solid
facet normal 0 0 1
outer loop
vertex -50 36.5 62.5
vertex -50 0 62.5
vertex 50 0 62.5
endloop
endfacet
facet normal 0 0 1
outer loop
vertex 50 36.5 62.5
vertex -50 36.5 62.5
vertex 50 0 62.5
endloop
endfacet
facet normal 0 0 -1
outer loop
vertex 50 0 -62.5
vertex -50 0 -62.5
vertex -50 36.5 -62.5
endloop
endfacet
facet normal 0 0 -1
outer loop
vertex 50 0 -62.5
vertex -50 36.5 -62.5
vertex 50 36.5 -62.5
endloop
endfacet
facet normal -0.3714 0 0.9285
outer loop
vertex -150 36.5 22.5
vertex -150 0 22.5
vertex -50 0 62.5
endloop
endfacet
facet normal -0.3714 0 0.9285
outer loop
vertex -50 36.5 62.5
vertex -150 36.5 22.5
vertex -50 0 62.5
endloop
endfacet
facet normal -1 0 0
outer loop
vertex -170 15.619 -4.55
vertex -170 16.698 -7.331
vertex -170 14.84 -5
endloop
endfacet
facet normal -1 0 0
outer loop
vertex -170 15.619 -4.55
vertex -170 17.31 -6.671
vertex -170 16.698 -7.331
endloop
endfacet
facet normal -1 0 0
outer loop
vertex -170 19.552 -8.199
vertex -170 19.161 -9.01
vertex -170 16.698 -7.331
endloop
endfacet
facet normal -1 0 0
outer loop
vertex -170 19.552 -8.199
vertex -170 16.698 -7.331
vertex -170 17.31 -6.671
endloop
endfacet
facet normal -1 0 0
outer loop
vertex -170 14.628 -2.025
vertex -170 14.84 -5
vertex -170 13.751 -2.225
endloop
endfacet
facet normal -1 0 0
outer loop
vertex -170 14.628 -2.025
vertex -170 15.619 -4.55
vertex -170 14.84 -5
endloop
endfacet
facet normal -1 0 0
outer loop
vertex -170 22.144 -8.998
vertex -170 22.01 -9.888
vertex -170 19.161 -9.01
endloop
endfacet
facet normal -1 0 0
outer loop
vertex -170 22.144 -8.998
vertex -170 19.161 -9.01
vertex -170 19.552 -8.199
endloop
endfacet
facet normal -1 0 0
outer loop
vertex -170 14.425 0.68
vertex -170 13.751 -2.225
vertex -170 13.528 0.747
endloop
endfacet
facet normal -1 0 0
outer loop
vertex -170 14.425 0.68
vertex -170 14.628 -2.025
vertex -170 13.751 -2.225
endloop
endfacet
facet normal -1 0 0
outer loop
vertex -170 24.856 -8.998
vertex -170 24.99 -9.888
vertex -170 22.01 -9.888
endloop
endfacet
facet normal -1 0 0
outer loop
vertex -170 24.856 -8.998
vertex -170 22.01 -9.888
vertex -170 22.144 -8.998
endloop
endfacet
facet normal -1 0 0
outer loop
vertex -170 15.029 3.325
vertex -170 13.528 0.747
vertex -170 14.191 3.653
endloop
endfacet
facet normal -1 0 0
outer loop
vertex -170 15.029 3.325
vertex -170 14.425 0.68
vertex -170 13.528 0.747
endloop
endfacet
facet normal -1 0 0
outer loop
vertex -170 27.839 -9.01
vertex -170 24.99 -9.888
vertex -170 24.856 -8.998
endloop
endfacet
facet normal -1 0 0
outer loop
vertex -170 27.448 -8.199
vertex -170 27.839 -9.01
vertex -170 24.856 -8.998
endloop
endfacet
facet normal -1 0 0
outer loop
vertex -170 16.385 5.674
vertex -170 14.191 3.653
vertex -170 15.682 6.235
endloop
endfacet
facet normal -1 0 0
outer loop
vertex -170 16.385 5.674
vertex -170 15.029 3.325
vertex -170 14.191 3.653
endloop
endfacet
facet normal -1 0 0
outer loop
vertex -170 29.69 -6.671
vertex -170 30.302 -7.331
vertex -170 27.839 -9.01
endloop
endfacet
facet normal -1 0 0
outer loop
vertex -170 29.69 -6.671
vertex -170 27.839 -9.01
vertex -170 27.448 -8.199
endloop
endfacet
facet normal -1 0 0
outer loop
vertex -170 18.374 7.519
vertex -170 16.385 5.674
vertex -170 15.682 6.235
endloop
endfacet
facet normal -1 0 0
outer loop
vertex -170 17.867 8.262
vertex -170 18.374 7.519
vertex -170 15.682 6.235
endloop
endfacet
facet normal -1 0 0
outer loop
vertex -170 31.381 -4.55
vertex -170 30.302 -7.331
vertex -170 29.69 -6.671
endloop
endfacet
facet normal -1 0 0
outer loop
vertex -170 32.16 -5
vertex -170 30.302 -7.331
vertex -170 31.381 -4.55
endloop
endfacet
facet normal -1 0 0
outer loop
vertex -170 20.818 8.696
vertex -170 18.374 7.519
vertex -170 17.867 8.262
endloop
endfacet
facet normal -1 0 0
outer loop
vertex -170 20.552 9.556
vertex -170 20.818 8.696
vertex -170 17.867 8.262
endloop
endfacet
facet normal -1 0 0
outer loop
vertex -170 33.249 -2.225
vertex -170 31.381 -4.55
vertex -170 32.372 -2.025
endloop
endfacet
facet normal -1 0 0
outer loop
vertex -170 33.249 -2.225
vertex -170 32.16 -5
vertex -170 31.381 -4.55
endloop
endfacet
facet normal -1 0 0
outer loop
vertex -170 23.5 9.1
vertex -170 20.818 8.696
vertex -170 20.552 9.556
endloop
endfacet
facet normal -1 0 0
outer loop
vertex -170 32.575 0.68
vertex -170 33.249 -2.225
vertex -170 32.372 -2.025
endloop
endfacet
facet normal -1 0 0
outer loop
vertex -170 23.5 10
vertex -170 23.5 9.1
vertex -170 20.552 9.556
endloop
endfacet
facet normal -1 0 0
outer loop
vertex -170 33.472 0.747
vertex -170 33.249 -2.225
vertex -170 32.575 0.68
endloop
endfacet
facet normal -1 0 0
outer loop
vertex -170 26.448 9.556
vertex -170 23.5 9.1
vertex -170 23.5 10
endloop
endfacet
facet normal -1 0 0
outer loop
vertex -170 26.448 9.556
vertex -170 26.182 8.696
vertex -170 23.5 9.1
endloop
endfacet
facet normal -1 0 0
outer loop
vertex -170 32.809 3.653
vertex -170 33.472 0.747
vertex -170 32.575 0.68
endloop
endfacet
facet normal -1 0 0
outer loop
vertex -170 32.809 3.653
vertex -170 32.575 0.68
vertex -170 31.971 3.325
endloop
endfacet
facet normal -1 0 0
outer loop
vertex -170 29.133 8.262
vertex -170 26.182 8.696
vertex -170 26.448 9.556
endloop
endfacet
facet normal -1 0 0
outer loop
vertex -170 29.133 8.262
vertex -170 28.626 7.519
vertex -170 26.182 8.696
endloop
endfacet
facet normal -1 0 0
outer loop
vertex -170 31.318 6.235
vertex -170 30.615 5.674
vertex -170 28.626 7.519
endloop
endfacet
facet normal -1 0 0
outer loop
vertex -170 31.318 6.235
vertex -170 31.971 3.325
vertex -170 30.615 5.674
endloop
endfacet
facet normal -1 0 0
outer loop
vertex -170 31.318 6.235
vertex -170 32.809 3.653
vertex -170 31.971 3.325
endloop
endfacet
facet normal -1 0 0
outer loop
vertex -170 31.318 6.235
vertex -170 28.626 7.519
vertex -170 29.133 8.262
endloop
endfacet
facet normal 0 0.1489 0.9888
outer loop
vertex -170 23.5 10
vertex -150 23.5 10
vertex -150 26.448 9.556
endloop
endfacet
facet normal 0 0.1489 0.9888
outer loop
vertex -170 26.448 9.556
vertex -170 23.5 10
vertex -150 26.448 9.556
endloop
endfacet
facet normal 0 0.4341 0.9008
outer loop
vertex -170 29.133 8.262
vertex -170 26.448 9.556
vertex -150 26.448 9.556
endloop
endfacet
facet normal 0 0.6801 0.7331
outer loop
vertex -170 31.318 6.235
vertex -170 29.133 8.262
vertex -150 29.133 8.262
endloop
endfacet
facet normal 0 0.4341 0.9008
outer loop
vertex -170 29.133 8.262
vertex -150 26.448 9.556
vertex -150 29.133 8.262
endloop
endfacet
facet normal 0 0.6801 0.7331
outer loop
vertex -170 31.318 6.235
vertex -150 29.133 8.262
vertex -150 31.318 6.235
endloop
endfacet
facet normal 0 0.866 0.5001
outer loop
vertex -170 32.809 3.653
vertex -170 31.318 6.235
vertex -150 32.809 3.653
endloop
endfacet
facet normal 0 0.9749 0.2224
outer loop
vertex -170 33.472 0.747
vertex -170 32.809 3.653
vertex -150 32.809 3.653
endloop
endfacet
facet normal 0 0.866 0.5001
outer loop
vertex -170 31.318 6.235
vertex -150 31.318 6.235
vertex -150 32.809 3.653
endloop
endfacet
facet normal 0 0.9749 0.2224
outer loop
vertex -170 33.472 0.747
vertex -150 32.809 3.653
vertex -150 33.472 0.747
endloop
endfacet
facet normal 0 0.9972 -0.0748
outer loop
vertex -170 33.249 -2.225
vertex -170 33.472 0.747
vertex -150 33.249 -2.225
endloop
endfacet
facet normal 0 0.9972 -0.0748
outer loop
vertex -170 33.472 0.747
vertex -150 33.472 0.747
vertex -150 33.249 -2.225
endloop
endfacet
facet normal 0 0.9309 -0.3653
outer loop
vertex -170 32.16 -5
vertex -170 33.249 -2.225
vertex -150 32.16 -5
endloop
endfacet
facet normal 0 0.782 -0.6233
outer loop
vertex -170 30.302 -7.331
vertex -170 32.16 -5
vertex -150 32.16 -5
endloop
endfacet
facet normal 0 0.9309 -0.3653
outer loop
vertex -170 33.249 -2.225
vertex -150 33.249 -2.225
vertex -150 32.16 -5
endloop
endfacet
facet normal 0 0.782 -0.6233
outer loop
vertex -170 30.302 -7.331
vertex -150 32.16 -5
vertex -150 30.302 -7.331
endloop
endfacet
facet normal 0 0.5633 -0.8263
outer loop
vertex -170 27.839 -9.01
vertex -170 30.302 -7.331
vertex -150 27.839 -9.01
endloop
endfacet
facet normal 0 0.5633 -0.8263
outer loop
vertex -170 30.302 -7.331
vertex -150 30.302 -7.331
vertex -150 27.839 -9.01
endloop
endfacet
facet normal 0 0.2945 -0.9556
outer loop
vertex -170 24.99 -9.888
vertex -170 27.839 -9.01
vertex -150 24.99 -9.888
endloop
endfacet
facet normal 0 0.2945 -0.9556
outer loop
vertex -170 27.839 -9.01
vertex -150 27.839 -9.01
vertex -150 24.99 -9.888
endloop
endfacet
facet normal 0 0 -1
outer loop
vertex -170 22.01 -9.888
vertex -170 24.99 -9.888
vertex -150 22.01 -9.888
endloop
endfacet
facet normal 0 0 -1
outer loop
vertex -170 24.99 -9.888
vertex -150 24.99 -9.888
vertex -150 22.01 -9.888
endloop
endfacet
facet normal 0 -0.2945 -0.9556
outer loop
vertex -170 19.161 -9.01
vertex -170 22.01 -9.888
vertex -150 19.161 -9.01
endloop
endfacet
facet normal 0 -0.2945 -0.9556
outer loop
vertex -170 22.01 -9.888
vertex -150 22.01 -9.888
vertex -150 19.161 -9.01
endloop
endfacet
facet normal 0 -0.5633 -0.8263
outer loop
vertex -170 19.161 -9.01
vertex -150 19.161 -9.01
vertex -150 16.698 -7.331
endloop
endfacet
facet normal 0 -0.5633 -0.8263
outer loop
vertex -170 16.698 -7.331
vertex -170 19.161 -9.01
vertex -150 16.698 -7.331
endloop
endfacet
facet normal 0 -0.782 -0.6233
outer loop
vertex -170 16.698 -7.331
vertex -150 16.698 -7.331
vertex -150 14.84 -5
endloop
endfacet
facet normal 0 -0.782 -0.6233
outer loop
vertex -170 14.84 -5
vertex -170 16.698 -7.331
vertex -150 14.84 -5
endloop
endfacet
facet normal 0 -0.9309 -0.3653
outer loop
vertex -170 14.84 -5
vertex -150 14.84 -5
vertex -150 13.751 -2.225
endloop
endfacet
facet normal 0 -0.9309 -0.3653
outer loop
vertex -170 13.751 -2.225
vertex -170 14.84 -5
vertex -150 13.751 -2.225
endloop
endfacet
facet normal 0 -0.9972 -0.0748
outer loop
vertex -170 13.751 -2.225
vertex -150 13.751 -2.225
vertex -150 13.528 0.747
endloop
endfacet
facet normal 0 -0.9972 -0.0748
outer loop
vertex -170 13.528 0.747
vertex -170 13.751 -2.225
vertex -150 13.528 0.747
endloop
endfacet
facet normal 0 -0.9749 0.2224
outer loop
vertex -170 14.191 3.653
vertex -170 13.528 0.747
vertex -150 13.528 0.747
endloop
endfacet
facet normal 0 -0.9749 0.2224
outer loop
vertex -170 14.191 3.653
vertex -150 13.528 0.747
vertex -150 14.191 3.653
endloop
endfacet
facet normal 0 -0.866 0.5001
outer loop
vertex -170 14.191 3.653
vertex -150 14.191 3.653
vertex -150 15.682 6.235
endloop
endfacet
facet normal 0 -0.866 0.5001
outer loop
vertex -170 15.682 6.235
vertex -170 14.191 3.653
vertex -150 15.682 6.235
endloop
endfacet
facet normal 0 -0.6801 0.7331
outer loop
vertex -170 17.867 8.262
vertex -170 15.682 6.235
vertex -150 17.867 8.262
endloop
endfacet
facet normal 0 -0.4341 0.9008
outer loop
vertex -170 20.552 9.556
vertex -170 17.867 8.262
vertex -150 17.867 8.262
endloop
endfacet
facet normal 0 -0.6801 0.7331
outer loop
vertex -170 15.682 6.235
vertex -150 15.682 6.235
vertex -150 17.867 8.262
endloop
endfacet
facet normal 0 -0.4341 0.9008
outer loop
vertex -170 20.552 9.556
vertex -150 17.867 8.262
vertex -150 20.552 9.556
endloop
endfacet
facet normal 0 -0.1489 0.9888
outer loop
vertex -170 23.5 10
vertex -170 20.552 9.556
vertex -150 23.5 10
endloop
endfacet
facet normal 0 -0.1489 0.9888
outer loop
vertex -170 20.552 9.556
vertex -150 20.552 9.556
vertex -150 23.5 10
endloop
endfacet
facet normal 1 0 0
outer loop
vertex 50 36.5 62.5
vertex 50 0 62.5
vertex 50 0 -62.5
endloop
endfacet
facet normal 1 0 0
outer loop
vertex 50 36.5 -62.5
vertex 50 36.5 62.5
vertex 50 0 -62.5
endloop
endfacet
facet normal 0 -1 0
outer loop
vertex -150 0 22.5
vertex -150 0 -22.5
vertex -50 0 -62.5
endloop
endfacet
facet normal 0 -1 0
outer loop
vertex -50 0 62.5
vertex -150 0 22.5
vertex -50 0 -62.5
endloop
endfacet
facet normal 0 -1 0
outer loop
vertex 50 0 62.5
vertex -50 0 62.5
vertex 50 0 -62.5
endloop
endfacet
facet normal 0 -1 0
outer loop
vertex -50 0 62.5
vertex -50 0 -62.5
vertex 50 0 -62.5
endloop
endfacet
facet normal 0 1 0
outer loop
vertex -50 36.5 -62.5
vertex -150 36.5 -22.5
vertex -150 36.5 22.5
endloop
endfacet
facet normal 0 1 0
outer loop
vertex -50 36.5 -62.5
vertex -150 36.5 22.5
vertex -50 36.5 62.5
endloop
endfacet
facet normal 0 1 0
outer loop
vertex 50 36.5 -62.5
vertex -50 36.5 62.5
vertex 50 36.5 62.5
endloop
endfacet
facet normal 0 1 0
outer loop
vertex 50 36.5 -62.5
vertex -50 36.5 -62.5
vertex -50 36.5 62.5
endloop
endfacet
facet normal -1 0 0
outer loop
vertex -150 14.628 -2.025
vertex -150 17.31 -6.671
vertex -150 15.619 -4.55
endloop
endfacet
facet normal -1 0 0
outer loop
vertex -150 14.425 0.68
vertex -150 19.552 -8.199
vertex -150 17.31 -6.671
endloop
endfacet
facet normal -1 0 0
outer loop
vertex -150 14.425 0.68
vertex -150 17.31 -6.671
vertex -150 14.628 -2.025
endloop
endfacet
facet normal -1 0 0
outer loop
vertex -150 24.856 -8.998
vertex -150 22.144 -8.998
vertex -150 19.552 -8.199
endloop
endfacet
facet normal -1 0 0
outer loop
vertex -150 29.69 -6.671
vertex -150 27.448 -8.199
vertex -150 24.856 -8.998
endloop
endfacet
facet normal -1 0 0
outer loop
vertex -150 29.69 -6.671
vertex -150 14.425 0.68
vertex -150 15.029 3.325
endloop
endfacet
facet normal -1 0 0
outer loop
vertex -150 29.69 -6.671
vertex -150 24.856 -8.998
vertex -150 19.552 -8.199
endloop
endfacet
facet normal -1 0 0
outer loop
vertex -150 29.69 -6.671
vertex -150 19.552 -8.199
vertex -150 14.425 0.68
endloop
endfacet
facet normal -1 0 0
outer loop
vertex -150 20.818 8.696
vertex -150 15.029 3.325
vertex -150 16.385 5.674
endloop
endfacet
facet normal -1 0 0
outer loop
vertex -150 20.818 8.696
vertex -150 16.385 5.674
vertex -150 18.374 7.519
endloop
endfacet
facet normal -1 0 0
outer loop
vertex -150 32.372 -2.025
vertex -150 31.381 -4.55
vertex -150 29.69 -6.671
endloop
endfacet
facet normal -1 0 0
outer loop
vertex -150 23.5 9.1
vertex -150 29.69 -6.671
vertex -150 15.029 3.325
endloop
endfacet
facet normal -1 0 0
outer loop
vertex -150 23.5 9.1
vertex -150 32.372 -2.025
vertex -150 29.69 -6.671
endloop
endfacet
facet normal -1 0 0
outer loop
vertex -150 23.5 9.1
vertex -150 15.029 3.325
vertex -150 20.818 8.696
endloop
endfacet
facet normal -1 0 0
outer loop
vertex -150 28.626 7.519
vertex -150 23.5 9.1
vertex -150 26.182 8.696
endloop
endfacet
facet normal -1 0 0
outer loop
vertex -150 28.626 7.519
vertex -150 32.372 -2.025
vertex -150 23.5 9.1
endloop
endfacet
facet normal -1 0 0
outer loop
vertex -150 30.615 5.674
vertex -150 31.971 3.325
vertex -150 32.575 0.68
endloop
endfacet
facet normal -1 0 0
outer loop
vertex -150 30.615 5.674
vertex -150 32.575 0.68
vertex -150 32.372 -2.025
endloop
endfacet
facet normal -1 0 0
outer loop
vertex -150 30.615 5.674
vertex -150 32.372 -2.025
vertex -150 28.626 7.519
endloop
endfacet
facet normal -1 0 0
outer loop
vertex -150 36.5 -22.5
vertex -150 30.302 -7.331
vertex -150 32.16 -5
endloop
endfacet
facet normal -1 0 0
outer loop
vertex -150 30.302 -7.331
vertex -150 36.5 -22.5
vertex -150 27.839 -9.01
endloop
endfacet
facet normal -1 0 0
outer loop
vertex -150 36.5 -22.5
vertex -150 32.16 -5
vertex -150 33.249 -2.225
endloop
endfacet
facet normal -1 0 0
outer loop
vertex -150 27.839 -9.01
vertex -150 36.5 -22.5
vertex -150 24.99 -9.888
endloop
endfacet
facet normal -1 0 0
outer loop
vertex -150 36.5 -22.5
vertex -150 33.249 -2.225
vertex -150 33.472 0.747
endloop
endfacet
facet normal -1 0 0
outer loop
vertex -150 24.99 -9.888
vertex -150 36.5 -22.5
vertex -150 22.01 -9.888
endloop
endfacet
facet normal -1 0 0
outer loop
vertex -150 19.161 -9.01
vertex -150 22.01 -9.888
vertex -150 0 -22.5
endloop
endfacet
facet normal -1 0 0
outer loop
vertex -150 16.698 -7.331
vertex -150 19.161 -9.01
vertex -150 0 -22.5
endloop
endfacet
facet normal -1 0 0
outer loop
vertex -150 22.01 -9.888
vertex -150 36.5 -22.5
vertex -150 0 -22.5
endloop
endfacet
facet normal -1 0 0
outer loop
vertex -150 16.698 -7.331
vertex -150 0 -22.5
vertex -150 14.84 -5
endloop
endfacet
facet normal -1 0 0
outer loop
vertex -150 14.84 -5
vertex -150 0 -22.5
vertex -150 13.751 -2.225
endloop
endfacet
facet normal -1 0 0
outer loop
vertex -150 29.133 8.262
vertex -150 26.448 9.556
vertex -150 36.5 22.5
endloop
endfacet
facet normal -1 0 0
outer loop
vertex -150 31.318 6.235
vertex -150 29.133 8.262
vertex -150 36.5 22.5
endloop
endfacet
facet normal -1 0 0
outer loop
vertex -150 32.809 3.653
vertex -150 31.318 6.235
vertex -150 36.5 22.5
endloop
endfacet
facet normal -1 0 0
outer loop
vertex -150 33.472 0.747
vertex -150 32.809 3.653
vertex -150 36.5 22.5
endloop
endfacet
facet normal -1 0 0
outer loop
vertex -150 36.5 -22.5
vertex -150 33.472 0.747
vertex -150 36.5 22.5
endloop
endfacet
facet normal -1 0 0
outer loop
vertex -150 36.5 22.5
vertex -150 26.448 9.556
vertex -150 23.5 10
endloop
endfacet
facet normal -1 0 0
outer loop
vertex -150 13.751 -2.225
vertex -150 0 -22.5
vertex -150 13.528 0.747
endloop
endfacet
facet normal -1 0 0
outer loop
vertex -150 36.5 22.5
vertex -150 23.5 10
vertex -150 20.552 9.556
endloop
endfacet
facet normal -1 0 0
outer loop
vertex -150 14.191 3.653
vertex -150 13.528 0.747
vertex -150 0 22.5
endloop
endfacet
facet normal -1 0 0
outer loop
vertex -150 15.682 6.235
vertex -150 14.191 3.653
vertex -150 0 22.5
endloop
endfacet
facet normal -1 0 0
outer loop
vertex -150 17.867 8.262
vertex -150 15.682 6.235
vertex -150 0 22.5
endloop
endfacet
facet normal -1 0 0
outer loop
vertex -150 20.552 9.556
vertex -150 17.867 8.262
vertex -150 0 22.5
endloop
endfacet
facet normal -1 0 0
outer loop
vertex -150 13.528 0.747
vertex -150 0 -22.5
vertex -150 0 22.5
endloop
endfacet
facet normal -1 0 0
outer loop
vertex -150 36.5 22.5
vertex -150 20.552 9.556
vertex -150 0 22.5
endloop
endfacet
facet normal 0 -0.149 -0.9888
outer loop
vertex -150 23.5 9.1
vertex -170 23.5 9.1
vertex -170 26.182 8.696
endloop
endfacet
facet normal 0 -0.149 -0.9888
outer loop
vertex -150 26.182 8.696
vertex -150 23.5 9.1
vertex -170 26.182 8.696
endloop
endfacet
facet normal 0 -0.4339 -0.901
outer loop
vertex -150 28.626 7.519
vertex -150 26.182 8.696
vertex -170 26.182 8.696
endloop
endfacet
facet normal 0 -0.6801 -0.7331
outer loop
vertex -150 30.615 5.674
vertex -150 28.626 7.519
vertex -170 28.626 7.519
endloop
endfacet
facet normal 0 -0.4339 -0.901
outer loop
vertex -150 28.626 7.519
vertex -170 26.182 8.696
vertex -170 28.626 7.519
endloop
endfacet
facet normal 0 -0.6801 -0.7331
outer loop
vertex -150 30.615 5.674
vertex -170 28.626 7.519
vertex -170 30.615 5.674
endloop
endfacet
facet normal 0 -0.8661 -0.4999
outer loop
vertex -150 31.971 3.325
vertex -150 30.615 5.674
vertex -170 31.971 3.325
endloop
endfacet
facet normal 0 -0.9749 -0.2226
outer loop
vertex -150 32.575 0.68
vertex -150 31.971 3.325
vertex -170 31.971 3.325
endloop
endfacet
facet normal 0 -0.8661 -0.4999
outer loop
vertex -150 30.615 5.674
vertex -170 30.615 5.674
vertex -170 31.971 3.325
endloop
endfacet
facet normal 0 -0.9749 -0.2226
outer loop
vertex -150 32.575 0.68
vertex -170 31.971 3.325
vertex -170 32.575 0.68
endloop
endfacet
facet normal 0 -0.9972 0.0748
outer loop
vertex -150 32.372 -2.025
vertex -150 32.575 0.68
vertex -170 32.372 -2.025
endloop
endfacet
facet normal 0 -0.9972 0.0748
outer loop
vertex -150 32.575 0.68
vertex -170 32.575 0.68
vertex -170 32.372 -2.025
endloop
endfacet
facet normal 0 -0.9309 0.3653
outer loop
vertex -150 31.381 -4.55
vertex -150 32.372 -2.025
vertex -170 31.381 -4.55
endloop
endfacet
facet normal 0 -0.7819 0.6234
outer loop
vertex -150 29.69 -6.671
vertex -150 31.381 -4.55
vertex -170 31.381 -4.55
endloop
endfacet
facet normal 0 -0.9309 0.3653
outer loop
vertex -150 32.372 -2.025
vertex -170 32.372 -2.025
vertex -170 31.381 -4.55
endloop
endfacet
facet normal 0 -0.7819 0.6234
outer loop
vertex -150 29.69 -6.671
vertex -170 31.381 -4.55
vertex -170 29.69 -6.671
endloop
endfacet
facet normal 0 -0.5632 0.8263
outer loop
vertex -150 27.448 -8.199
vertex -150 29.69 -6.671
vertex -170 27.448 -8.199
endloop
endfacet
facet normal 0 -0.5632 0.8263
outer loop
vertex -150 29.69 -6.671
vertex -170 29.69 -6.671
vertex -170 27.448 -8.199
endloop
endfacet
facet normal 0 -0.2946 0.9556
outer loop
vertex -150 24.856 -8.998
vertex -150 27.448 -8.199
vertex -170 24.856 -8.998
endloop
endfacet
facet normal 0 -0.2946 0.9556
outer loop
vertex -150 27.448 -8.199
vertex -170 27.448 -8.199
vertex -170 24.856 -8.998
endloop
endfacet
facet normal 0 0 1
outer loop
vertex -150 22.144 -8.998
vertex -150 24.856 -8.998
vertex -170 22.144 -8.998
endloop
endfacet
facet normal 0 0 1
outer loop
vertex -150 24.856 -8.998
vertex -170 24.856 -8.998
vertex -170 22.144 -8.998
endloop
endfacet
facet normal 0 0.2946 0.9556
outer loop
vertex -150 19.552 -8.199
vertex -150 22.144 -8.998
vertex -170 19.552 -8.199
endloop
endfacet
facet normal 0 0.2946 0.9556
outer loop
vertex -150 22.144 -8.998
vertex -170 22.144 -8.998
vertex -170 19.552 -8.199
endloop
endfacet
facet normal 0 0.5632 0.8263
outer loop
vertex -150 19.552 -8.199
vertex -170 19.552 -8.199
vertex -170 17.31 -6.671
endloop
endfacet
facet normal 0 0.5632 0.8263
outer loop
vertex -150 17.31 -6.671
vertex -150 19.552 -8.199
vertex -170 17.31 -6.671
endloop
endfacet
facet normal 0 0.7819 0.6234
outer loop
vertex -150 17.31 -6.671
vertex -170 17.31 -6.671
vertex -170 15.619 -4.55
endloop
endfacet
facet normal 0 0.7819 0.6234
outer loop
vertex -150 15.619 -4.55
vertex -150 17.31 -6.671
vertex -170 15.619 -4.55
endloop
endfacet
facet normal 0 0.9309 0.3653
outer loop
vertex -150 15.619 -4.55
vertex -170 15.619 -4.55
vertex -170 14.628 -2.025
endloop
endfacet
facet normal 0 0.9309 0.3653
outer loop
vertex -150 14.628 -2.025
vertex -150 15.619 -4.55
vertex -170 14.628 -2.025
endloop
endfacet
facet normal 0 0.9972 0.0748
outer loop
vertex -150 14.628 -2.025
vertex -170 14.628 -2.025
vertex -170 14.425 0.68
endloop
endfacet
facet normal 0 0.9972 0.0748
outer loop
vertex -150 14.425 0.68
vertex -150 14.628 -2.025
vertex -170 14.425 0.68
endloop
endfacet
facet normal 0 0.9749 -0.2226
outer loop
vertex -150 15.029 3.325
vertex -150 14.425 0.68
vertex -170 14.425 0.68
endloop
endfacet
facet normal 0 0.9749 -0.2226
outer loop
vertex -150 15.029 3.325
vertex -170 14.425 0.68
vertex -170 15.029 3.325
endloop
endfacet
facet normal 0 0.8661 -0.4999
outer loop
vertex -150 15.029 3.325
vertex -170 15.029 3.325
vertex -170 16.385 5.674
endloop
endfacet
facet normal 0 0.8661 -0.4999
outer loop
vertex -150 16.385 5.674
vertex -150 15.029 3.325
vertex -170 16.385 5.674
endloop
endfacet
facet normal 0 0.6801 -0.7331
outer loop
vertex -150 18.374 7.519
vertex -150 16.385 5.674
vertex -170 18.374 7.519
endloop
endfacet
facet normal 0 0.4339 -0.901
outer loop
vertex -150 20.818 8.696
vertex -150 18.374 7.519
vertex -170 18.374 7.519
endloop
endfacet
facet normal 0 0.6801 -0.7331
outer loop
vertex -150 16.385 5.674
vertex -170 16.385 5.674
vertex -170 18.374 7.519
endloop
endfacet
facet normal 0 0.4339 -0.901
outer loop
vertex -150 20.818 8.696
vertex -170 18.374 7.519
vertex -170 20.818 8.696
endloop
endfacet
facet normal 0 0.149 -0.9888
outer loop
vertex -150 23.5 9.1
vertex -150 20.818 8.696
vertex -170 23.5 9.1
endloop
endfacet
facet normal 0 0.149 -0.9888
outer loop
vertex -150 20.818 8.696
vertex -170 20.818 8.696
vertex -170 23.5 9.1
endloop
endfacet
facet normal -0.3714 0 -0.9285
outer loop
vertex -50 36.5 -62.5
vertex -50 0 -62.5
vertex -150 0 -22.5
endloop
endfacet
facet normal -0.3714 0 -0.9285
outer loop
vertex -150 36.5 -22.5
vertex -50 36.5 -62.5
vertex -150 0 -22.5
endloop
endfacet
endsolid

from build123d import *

# Parameters (mm, degrees)
SKETCH1_W           = 100
SKETCH1_H           = 125
BOSS_EXTRUDE1_DEPTH = 36.5
SKETCH27_R          = 10
BOSS_EXTRUDE2_DEPTH = 20
SKETCH28_R          = 9.1
CUT_EXTRUDE11_DEPTH = 20


with BuildPart() as part:
    # Sketch1 → Boss-Extrude1 (new body)
    with BuildSketch(Plane(origin=(0, 0, 0), x_dir=(1, 0, 0), z_dir=(0, 1, 0))):
        Polygon((-150, 22.5), (-150, -22.5), (-50, -62.5), (-50, 62.5), align=None)
        Rectangle(SKETCH1_W, SKETCH1_H)
    extrude(amount=BOSS_EXTRUDE1_DEPTH)

    # Sketch27 → Boss-Extrude2 (add)
    with BuildSketch(Plane.ZY.offset(150)):
        with Locations((0, 23.5)):
            Circle(SKETCH27_R)
    extrude(amount=BOSS_EXTRUDE2_DEPTH)

    # Sketch28 → Cut-Extrude11 (cut)
    with BuildSketch(Plane.ZY.offset(170)):
        with Locations((0, 23.5)):
            Circle(SKETCH28_R)
    extrude(amount=-CUT_EXTRUDE11_DEPTH, mode=Mode.SUBTRACT)


solid = part.part
